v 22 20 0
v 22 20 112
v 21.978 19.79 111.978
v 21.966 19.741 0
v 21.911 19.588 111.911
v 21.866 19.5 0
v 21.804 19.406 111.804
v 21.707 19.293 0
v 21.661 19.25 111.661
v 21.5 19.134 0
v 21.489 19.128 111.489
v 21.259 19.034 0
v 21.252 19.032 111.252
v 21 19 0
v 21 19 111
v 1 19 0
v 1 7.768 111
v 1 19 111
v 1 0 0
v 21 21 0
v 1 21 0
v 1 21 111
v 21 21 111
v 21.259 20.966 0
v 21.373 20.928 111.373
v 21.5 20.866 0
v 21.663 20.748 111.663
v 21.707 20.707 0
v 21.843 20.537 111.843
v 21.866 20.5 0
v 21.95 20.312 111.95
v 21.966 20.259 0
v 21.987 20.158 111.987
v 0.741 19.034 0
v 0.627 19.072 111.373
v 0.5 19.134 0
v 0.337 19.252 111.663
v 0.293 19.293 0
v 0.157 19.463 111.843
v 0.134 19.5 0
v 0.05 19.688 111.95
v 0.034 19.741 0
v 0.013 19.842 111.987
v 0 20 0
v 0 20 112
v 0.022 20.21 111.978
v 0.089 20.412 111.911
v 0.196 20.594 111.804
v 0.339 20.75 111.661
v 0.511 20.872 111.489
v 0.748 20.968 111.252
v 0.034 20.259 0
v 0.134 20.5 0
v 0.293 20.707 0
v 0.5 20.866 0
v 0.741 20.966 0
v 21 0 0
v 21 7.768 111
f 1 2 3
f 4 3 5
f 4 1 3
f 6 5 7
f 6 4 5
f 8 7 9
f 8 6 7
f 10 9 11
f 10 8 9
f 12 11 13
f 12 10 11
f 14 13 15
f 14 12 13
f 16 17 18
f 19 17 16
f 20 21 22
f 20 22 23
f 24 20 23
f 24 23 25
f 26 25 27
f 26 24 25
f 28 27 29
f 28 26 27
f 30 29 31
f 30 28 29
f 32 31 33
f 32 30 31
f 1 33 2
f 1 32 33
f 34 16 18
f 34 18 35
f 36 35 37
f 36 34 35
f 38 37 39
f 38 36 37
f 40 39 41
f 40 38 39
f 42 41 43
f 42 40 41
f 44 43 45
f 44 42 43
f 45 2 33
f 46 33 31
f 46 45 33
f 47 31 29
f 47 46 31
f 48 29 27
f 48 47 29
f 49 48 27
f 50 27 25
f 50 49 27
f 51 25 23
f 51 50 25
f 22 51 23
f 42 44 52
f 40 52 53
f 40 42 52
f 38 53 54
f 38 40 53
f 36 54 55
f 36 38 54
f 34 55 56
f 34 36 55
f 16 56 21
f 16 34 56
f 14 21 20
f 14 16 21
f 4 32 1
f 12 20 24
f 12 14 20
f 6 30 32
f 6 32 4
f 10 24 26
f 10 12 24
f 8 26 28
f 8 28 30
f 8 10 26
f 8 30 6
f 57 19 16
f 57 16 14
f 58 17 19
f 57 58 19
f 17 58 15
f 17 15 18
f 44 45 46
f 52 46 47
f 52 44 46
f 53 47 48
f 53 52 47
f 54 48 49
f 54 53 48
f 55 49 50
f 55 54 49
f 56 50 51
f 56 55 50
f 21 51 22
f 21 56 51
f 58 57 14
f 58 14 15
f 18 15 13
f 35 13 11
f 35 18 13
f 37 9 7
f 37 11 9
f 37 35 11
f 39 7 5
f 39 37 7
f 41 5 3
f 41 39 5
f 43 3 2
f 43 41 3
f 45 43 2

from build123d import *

# Parameters (mm, degrees)
SKETCH1_W           = 22
SKETCH1_H           = 112
BOSS_EXTRUDE1_DEPTH = 21
CUT_EXTRUDE1_DEPTH  = 19
FILLET1_START       = -1
FILLET1_DEPTH       = 113
FILLET1_2_DEPTH     = 113
FILLET1_3_DEPTH     = 24
CUT_EXTRUDE11_DEPTH = 116.870617501


with BuildPart() as part:
    # Sketch1 → Boss-Extrude1 (new body)
    with BuildSketch(Plane(origin=(0, 0, 0), x_dir=(1, 0, 0), z_dir=(0, 1, 0))):
        with Locations((11, -56)):
            Rectangle(SKETCH1_W, SKETCH1_H)
    extrude(amount=BOSS_EXTRUDE1_DEPTH)

    # Sketch2 → Cut-Extrude1 (cut)
    with BuildSketch(Plane.XZ):
        Polygon((0, 112), (22, 112), (22, 0), (21, 0), (21, 111), (1, 111), (1, 0), (0, 0), align=None)
    extrude(amount=-CUT_EXTRUDE1_DEPTH, mode=Mode.SUBTRACT)

    # Fillet1: read off the stored shape, not the designer's step
    # Fillet1 outline → Fillet1 (cut)
    with BuildSketch(Plane.XY.offset(FILLET1_START)):
        with BuildLine():
            Line((0, 19), (1, 19))
            ThreePointArc((1, 19), (0.292893219, 19.292893219), (0, 20))
            Line((0, 20), (0, 19))
        make_face()
        with BuildLine():
            ThreePointArc((22, 20), (21.707106781, 19.292893219), (21, 19))
            Line((21, 19), (22, 19))
            Line((22, 19), (22, 20))
        make_face()
    extrude(amount=FILLET1_DEPTH, mode=Mode.SUBTRACT)

    # Fillet1 2 outline → Fillet1 2 (cut)
    with BuildSketch(Plane.XY.offset(FILLET1_START)):
        with BuildLine():
            Line((0, 21), (0, 20))
            ThreePointArc((0, 20), (0.292893219, 20.707106781), (1, 21))
            Line((1, 21), (0, 21))
        make_face()
        with BuildLine():
            Line((22, 21), (21, 21))
            ThreePointArc((21, 21), (21.707106781, 20.707106781), (22, 20))
            Line((22, 20), (22, 21))
        make_face()
    extrude(amount=FILLET1_2_DEPTH, mode=Mode.SUBTRACT)

    # Fillet1 3 outline → Fillet1 3 (cut)
    with BuildSketch(Plane.YZ.offset(FILLET1_START)):
        with BuildLine():
            Line((21, 112), (20, 112))
            ThreePointArc((20, 112), (20.707106781, 111.707106781), (21, 111))
            Line((21, 111), (21, 112))
        make_face()
        with BuildLine():
            ThreePointArc((19, 111), (19.292893219, 111.707106781), (20, 112))
            Line((20, 112), (19, 112))
            Line((19, 112), (19, 111))
        make_face()
    extrude(amount=FILLET1_3_DEPTH, mode=Mode.SUBTRACT)

    # Sketch11 → Cut-Extrude11 (cut, through all)
    with BuildSketch(Plane.ZY.offset(-1)):
        Polygon((0, 0), (111, 0), (111, 7.767718463), align=None)
    extrude(amount=-CUT_EXTRUDE11_DEPTH, mode=Mode.SUBTRACT)


solid = part.part
